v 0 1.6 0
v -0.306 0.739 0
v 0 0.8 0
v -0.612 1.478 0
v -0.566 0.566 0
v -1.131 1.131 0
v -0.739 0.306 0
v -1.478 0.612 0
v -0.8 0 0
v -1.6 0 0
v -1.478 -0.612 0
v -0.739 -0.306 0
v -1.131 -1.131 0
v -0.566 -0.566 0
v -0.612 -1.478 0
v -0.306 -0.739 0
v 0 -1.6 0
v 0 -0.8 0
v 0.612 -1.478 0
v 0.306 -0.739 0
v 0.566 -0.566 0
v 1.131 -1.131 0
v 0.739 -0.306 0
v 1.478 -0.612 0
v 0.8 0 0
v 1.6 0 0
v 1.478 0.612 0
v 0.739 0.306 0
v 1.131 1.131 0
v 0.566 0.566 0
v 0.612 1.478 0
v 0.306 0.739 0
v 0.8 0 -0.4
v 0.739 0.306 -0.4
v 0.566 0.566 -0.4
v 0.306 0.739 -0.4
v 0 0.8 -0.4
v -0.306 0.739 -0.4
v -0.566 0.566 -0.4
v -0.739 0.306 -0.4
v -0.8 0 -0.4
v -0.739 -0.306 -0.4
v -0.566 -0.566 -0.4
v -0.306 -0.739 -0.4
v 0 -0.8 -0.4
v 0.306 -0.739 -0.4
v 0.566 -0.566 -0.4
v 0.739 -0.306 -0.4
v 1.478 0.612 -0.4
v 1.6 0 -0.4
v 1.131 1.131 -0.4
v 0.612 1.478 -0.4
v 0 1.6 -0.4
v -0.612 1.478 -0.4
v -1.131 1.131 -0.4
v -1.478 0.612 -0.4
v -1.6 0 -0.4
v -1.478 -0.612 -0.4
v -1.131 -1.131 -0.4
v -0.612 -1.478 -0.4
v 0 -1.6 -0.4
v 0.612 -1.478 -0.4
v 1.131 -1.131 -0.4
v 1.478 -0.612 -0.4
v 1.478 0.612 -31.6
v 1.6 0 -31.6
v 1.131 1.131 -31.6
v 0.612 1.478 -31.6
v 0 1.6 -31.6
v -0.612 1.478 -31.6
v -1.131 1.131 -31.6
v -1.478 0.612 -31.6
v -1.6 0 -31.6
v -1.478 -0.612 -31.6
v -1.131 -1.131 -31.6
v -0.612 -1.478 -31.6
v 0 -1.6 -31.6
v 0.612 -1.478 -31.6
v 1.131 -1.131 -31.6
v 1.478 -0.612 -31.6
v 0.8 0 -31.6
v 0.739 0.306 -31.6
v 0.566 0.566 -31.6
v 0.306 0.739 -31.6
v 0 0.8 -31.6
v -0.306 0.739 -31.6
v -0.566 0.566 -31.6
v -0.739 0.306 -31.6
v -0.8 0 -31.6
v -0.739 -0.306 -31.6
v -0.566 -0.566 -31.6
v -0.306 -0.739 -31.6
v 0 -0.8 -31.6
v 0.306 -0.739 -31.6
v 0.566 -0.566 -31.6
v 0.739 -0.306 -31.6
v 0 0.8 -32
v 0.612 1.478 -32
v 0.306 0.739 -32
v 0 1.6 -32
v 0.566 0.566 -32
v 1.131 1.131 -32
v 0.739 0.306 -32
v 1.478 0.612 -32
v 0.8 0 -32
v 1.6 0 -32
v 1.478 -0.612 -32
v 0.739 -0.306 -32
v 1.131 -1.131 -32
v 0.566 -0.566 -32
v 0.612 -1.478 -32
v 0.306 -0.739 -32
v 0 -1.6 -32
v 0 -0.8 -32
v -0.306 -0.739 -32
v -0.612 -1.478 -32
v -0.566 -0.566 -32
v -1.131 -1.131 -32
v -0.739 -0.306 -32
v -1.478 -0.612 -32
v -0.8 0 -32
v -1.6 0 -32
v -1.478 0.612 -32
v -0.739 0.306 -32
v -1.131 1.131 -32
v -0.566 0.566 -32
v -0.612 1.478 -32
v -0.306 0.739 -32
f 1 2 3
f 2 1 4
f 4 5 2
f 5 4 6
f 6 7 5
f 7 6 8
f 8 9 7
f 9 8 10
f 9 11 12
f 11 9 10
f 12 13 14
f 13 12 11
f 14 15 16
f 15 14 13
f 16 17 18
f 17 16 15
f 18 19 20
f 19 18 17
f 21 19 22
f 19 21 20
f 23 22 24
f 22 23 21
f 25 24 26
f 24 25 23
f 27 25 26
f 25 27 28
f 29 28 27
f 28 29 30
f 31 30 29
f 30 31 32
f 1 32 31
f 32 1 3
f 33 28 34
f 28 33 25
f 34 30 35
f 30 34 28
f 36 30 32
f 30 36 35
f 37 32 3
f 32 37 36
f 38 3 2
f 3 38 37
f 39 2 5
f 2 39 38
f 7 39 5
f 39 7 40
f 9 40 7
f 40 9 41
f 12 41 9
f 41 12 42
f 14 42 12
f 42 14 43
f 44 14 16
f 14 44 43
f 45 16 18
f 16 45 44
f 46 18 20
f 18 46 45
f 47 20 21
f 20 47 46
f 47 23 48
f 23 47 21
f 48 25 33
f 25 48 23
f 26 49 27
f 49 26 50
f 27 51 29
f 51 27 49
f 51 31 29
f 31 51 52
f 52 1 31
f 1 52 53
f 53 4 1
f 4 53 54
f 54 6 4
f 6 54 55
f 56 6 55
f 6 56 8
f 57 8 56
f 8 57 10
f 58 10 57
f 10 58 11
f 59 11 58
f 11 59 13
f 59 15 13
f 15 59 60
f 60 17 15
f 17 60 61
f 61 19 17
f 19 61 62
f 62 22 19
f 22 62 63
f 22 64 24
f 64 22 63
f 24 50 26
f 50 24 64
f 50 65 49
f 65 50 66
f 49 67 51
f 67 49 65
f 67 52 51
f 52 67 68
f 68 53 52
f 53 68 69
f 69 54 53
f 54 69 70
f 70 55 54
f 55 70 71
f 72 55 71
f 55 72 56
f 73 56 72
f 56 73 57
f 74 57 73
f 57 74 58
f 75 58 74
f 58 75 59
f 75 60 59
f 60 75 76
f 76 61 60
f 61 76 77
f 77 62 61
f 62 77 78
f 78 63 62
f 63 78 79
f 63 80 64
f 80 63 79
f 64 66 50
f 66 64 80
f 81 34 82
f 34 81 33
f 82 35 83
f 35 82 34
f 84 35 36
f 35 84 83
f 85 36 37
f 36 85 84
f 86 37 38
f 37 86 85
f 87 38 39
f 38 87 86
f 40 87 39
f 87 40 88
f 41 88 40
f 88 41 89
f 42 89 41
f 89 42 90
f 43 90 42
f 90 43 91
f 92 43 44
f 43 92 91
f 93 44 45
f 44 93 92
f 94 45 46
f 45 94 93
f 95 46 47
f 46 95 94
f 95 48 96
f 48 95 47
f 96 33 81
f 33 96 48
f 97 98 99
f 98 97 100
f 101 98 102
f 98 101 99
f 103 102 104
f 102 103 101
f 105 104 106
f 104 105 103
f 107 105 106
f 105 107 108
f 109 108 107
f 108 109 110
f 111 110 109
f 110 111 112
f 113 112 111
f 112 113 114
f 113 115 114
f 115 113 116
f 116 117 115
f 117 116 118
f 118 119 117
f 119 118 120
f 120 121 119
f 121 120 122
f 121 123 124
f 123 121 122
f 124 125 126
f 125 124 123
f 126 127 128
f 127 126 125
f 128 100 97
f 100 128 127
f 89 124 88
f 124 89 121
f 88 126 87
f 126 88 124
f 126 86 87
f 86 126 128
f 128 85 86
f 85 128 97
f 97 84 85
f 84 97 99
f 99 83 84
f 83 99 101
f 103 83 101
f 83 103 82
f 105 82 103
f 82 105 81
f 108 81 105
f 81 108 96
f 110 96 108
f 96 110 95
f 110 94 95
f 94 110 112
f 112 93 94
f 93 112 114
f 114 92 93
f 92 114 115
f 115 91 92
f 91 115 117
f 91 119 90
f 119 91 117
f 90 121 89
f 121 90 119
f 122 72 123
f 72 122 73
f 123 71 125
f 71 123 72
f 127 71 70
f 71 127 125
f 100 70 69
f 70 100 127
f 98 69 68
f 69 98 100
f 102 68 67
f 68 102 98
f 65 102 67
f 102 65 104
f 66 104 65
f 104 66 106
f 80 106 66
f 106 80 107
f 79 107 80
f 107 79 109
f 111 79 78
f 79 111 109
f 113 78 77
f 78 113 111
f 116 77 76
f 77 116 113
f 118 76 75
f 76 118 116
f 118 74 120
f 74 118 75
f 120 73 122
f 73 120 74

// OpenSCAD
// file: ../p/4-4ring1.scad
use <../lib.scad>
function ldraw_lib__4_4ring1() = [
// 0 Ring  1 x 1.0
// 0 Name: 4-4ring1.dat
// 0 Author: James Jessiman
// 0 !LDRAW_ORG Primitive UPDATE 2009-01
// 0 !LICENSE Licensed under CC BY 4.0 : see CAreadme.txt
// 
// 0 BFC CERTIFY CCW
  [0,"BFC","CERTIFY"],
  [0,"BFC","CCW"],
// 
// 0 !HISTORY 1998-12-15 [PTadmin] Official Update 1998-10
// 0 !HISTORY 2002-04-08 [BrickCaster] Modified for BFC compliance
// 0 !HISTORY 2002-04-25 [PTadmin] Official Update 2002-02
// 0 !HISTORY 2007-06-24 [PTadmin] Header formatted for Contributor Agreement
// 0 !HISTORY 2008-07-01 [PTadmin] Official Update 2008-01
// 0 !HISTORY 2008-08-26 [cwdee] Switch polygon winding and rename
// 0 !HISTORY 2009-05-02 [PTadmin] Official Update 2009-01
// 
// 
// 4 16 -0.7654 0 1.8478 -0.3827 0 0.9239 0 0 1 0 0 2
  [4,16,-0.7654,0,1.8478,-0.3827,0,0.9239,0,0,1,0,0,2],
// 4 16 -1.4142 0 1.4142 -0.7071 0 0.7071 -0.3827 0 0.9239 -0.7654 0 1.8478
  [4,16,-1.4142,0,1.4142,-0.7071,0,0.7071,-0.3827,0,0.9239,-0.7654,0,1.8478],
// 4 16 -1.8478 0 0.7654 -0.9239 0 0.3827 -0.7071 0 0.7071 -1.4142 0 1.41420
  [4,16,-1.8478,0,0.7654,-0.9239,0,0.3827,-0.7071,0,0.7071,-1.4142,0,1.41420],
// 4 16 -2 0 0 -1 0 0 -0.9239 0 0.3827 -1.8478 0 0.7654
  [4,16,-2,0,0,-1,0,0,-0.9239,0,0.3827,-1.8478,0,0.7654],
// 4 16 -1.8478 0 -0.7654 -0.9239 0 -0.3827 -1 0 0 -2 0 0
  [4,16,-1.8478,0,-0.7654,-0.9239,0,-0.3827,-1,0,0,-2,0,0],
// 4 16 -1.4142 0 -1.4142 -0.7071 0 -0.7071 -0.9239 0 -0.3827 -1.8478 0 -0.7654
  [4,16,-1.4142,0,-1.4142,-0.7071,0,-0.7071,-0.9239,0,-0.3827,-1.8478,0,-0.7654],
// 4 16 -0.7654 0 -1.8478 -0.3827 0 -0.9239 -0.7071 0 -0.7071 -1.4142 0 -1.4142
  [4,16,-0.7654,0,-1.8478,-0.3827,0,-0.9239,-0.7071,0,-0.7071,-1.4142,0,-1.4142],
// 4 16 0 0 -2 0 0 -1 -0.3827 0 -0.9239 -0.7654 0 -1.8478
  [4,16,0,0,-2,0,0,-1,-0.3827,0,-0.9239,-0.7654,0,-1.8478],
// 4 16 0.7654 0 -1.8478 0.3827 0 -0.9239 0 0 -1 0 0 -2
  [4,16,0.7654,0,-1.8478,0.3827,0,-0.9239,0,0,-1,0,0,-2],
// 4 16 1.4142 0 -1.4142 0.7071 0 -0.7071 0.3827 0 -0.9239 0.7654 0 -1.8478
  [4,16,1.4142,0,-1.4142,0.7071,0,-0.7071,0.3827,0,-0.9239,0.7654,0,-1.8478],
// 4 16 1.8478 0 -0.7654 0.9239 0 -0.3827 0.7071 0 -0.7071 1.4142 0 -1.4142
  [4,16,1.8478,0,-0.7654,0.9239,0,-0.3827,0.7071,0,-0.7071,1.4142,0,-1.4142],
// 4 16 2 0 0 1 0 0 0.9239 0 -0.3827 1.8478 0 -0.7654
  [4,16,2,0,0,1,0,0,0.9239,0,-0.3827,1.8478,0,-0.7654],
// 4 16 1.8478 0 0.7654 0.9239 0 0.3827 1 0 0 2 0 0
  [4,16,1.8478,0,0.7654,0.9239,0,0.3827,1,0,0,2,0,0],
// 4 16 1.4142 0 1.4142 0.7071 0 0.7071 0.9239 0 0.3827 1.8478 0 0.7654
  [4,16,1.4142,0,1.4142,0.7071,0,0.7071,0.9239,0,0.3827,1.8478,0,0.7654],
// 4 16 0.7654 0 1.8478 0.3827 0 0.9239 0.7071 0 0.7071 1.4142 0 1.4142
  [4,16,0.7654,0,1.8478,0.3827,0,0.9239,0.7071,0,0.7071,1.4142,0,1.4142],
// 4 16 0 0 2 0 0 1 0.3827 0 0.9239 0.7654 0 1.8478
  [4,16,0,0,2,0,0,1,0.3827,0,0.9239,0.7654,0,1.8478],
// 0
];
module ldraw_lib__4_4ring1(step=0, col=false, unit=2/5, alt=false, line=0.2, solid=!$preview)
    makepoly(ldraw_lib__4_4ring1(), step=step, col=col, unit=unit, alt=alt, line=line, solid=solid);
ldraw_lib__4_4ring1(line=0.2);
// file: ../p/4-4edge.scad
use <../lib.scad>
function ldraw_lib__4_4edge() = [
// 0 Circle 1.0
// 0 Name: 4-4edge.dat
// 0 Author: James Jessiman
// 0 !LDRAW_ORG Primitive UPDATE 2017-01
// 0 !LICENSE Licensed under CC BY 4.0 : see CAreadme.txt
// 
// 0 BFC CERTIFY CCW
  [0,"BFC","CERTIFY"],
  [0,"BFC","CCW"],
// 
// 0 !HISTORY 1998-12-15 [PTadmin] Official Update 1998-10
// 0 !HISTORY 2005-12-28 [PTadmin] Official Update 2005-01
// 0 !HISTORY 2007-06-24 [PTadmin] Header formatted for Contributor Agreement
// 0 !HISTORY 2008-07-01 [PTadmin] Official Update 2008-01
// 0 !HISTORY 2017-01-15 [Steffen] BFCed
// 0 !HISTORY 2017-12-30 [PTadmin] Official Update 2017-01
// 
// 
// 2 24 1 0 0 0.9239 0 0.3827
  [2,24,1,0,0,0.9239,0,0.3827],
// 2 24 0.9239 0 0.3827 0.7071 0 0.7071
  [2,24,0.9239,0,0.3827,0.7071,0,0.7071],
// 2 24 0.7071 0 0.7071 0.3827 0 0.9239
  [2,24,0.7071,0,0.7071,0.3827,0,0.9239],
// 2 24 0.3827 0 0.9239 0 0 1
  [2,24,0.3827,0,0.9239,0,0,1],
// 2 24 0 0 1 -0.3827 0 0.9239
  [2,24,0,0,1,-0.3827,0,0.9239],
// 2 24 -0.3827 0 0.9239 -0.7071 0 0.7071
  [2,24,-0.3827,0,0.9239,-0.7071,0,0.7071],
// 2 24 -0.7071 0 0.7071 -0.9239 0 0.3827
  [2,24,-0.7071,0,0.7071,-0.9239,0,0.3827],
// 2 24 -0.9239 0 0.3827 -1 0 -0
  [2,24,-0.9239,0,0.3827,-1,0,-0],
// 2 24 -1 0 -0 -0.9239 0 -0.3827
  [2,24,-1,0,-0,-0.9239,0,-0.3827],
// 2 24 -0.9239 0 -0.3827 -0.7071 0 -0.7071
  [2,24,-0.9239,0,-0.3827,-0.7071,0,-0.7071],
// 2 24 -0.7071 0 -0.7071 -0.3827 0 -0.9239
  [2,24,-0.7071,0,-0.7071,-0.3827,0,-0.9239],
// 2 24 -0.3827 0 -0.9239 0 0 -1
  [2,24,-0.3827,0,-0.9239,0,0,-1],
// 2 24 0 0 -1 0.3827 0 -0.9239
  [2,24,0,0,-1,0.3827,0,-0.9239],
// 2 24 0.3827 0 -0.9239 0.7071 0 -0.7071
  [2,24,0.3827,0,-0.9239,0.7071,0,-0.7071],
// 2 24 0.7071 0 -0.7071 0.9239 0 -0.3827
  [2,24,0.7071,0,-0.7071,0.9239,0,-0.3827],
// 2 24 0.9239 0 -0.3827 1 0 0
  [2,24,0.9239,0,-0.3827,1,0,0],
];
module ldraw_lib__4_4edge(step=0, col=false, unit=2/5, alt=false, line=0.2, solid=!$preview)
    makepoly(ldraw_lib__4_4edge(), step=step, col=col, unit=unit, alt=alt, line=line, solid=solid);
ldraw_lib__4_4edge(line=0.2);
// file: ../p/4-4cyli.scad
use <../lib.scad>
function ldraw_lib__4_4cyli() = [
// 0 Cylinder 1.0
// 0 Name: 4-4cyli.dat
// 0 Author: James Jessiman
// 0 !LDRAW_ORG Primitive UPDATE 2005-01
// 0 !LICENSE Licensed under CC BY 4.0 : see CAreadme.txt
// 
// 0 BFC CERTIFY CCW
  [0,"BFC","CERTIFY"],
  [0,"BFC","CCW"],
// 
// 0 !HISTORY 1998-12-15 [PTadmin] Official Update 1998-10
// 0 !HISTORY 2002-03-23 [sbliss] Added BFC statement; merged headers from files in distributions LDraw 0.27 and Complete.
// 0 !HISTORY 2002-04-25 [PTadmin] Official Update 2002-02
// 0 !HISTORY 2004-12-14 [guyvivan] BFC CCW
// 0 !HISTORY 2005-12-28 [PTadmin] Official Update 2005-01
// 0 !HISTORY 2007-06-24 [PTadmin] Header formatted for Contributor Agreement
// 0 !HISTORY 2008-07-01 [PTadmin] Official Update 2008-01
// 
// 
// 4 16 1 1 0 0.9239 1 0.3827 0.9239 0 0.3827 1 0 0
  [4,16,1,1,0,0.9239,1,0.3827,0.9239,0,0.3827,1,0,0],
// 5 24 1 0 0 1 1 0 0.9239 0 0.3827 0.9239 0 -0.3827
  [5,24,1,0,0,1,1,0,0.9239,0,0.3827,0.9239,0,-0.3827],
// 4 16 0.9239 1 0.3827 0.7071 1 0.7071 0.7071 0 0.7071 0.9239 0 0.3827
  [4,16,0.9239,1,0.3827,0.7071,1,0.7071,0.7071,0,0.7071,0.9239,0,0.3827],
// 5 24 0.9239 0 0.3827 0.9239 1 0.3827 0.7071 0 0.7071 1 0 0
  [5,24,0.9239,0,0.3827,0.9239,1,0.3827,0.7071,0,0.7071,1,0,0],
// 4 16 0.7071 1 0.7071 0.3827 1 0.9239 0.3827 0 0.9239 0.7071 0 0.7071
  [4,16,0.7071,1,0.7071,0.3827,1,0.9239,0.3827,0,0.9239,0.7071,0,0.7071],
// 5 24 0.7071 0 0.7071 0.7071 1 0.7071 0.3827 0 0.9239 0.9239 0 0.3827
  [5,24,0.7071,0,0.7071,0.7071,1,0.7071,0.3827,0,0.9239,0.9239,0,0.3827],
// 4 16 0.3827 1 0.9239 0 1 1 0 0 1 0.3827 0 0.9239
  [4,16,0.3827,1,0.9239,0,1,1,0,0,1,0.3827,0,0.9239],
// 5 24 0.3827 0 0.9239 0.3827 1 0.9239 0 0 1 0.7071 0 0.7071
  [5,24,0.3827,0,0.9239,0.3827,1,0.9239,0,0,1,0.7071,0,0.7071],
// 4 16 0 1 1 -0.3827 1 0.9239 -0.3827 0 0.9239 0 0 1
  [4,16,0,1,1,-0.3827,1,0.9239,-0.3827,0,0.9239,0,0,1],
// 5 24 0 0 1 0 1 1 -0.3827 0 0.9239 0.3827 0 0.9239
  [5,24,0,0,1,0,1,1,-0.3827,0,0.9239,0.3827,0,0.9239],
// 4 16 -0.3827 1 0.9239 -0.7071 1 0.7071 -0.7071 0 0.7071 -0.3827 0 0.9239
  [4,16,-0.3827,1,0.9239,-0.7071,1,0.7071,-0.7071,0,0.7071,-0.3827,0,0.9239],
// 5 24 -0.3827 0 0.9239 -0.3827 1 0.9239 -0.7071 0 0.7071 0 0 1
  [5,24,-0.3827,0,0.9239,-0.3827,1,0.9239,-0.7071,0,0.7071,0,0,1],
// 4 16 -0.7071 1 0.7071 -0.9239 1 0.3827 -0.9239 0 0.3827 -0.7071 0 0.7071
  [4,16,-0.7071,1,0.7071,-0.9239,1,0.3827,-0.9239,0,0.3827,-0.7071,0,0.7071],
// 5 24 -0.7071 0 0.7071 -0.7071 1 0.7071 -0.9239 0 0.3827 -0.3827 0 0.9239
  [5,24,-0.7071,0,0.7071,-0.7071,1,0.7071,-0.9239,0,0.3827,-0.3827,0,0.9239],
// 4 16 -0.9239 1 0.3827 -1 1 0 -1 0 0 -0.9239 0 0.3827
  [4,16,-0.9239,1,0.3827,-1,1,0,-1,0,0,-0.9239,0,0.3827],
// 5 24 -0.9239 0 0.3827 -0.9239 1 0.3827 -1 0 0 -0.7071 0 0.7071
  [5,24,-0.9239,0,0.3827,-0.9239,1,0.3827,-1,0,0,-0.7071,0,0.7071],
// 4 16 -1 1 0 -0.9239 1 -0.3827 -0.9239 0 -0.3827 -1 0 0
  [4,16,-1,1,0,-0.9239,1,-0.3827,-0.9239,0,-0.3827,-1,0,0],
// 5 24 -1 0 0 -1 1 0 -0.9239 0 -0.3827 -0.9239 0 0.3827
  [5,24,-1,0,0,-1,1,0,-0.9239,0,-0.3827,-0.9239,0,0.3827],
// 4 16 -0.9239 1 -0.3827 -0.7071 1 -0.7071 -0.7071 0 -0.7071 -0.9239 0 -0.3827
  [4,16,-0.9239,1,-0.3827,-0.7071,1,-0.7071,-0.7071,0,-0.7071,-0.9239,0,-0.3827],
// 5 24 -0.9239 0 -0.3827 -0.9239 1 -0.3827 -0.7071 0 -0.7071 -1 0 0
  [5,24,-0.9239,0,-0.3827,-0.9239,1,-0.3827,-0.7071,0,-0.7071,-1,0,0],
// 4 16 -0.7071 1 -0.7071 -0.3827 1 -0.9239 -0.3827 0 -0.9239 -0.7071 0 -0.7071
  [4,16,-0.7071,1,-0.7071,-0.3827,1,-0.9239,-0.3827,0,-0.9239,-0.7071,0,-0.7071],
// 5 24 -0.7071 0 -0.7071 -0.7071 1 -0.7071 -0.3827 0 -0.9239 -0.9239 0 -0.3827
  [5,24,-0.7071,0,-0.7071,-0.7071,1,-0.7071,-0.3827,0,-0.9239,-0.9239,0,-0.3827],
// 4 16 -0.3827 1 -0.9239 0 1 -1 0 0 -1 -0.3827 0 -0.9239
  [4,16,-0.3827,1,-0.9239,0,1,-1,0,0,-1,-0.3827,0,-0.9239],
// 5 24 -0.3827 0 -0.9239 -0.3827 1 -0.9239 0 0 -1 -0.7071 0 -0.7071
  [5,24,-0.3827,0,-0.9239,-0.3827,1,-0.9239,0,0,-1,-0.7071,0,-0.7071],
// 4 16 0 1 -1 0.3827 1 -0.9239 0.3827 0 -0.9239 0 0 -1
  [4,16,0,1,-1,0.3827,1,-0.9239,0.3827,0,-0.9239,0,0,-1],
// 5 24 0 0 -1 0 1 -1 0.3827 0 -0.9239 -0.3827 0 -0.9239
  [5,24,0,0,-1,0,1,-1,0.3827,0,-0.9239,-0.3827,0,-0.9239],
// 4 16 0.3827 1 -0.9239 0.7071 1 -0.7071 0.7071 0 -0.7071 0.3827 0 -0.9239
  [4,16,0.3827,1,-0.9239,0.7071,1,-0.7071,0.7071,0,-0.7071,0.3827,0,-0.9239],
// 5 24 0.3827 0 -0.9239 0.3827 1 -0.9239 0.7071 0 -0.7071 0 0 -1
  [5,24,0.3827,0,-0.9239,0.3827,1,-0.9239,0.7071,0,-0.7071,0,0,-1],
// 4 16 0.7071 1 -0.7071 0.9239 1 -0.3827 0.9239 0 -0.3827 0.7071 0 -0.7071
  [4,16,0.7071,1,-0.7071,0.9239,1,-0.3827,0.9239,0,-0.3827,0.7071,0,-0.7071],
// 5 24 0.7071 0 -0.7071 0.7071 1 -0.7071 0.9239 0 -0.3827 0.3827 0 -0.9239
  [5,24,0.7071,0,-0.7071,0.7071,1,-0.7071,0.9239,0,-0.3827,0.3827,0,-0.9239],
// 4 16 0.9239 1 -0.3827 1 1 0 1 0 0 0.9239 0 -0.3827
  [4,16,0.9239,1,-0.3827,1,1,0,1,0,0,0.9239,0,-0.3827],
// 5 24 0.9239 0 -0.3827 0.9239 1 -0.3827 1 0 0 0.7071 0 -0.7071
  [5,24,0.9239,0,-0.3827,0.9239,1,-0.3827,1,0,0,0.7071,0,-0.7071],
// 0
];
module ldraw_lib__4_4cyli(step=0, col=false, unit=2/5, alt=false, line=0.2, solid=!$preview)
    makepoly(ldraw_lib__4_4cyli(), step=step, col=col, unit=unit, alt=alt, line=line, solid=solid);
ldraw_lib__4_4cyli(line=0.2);
// file: u9053.scad
use <../lib.scad>
use <../p/4-4cyli.scad>
use <../p/4-4edge.scad>
use <../p/4-4ring1.scad>
function ldraw_lib__u9053() = [
// 0 ~Technic Flex-System Hose End
// 0 Name: u9053.dat
// 0 Author: William Howard [WilliamH]
// 0 !LDRAW_ORG Part UPDATE 2011-02
// 0 !LICENSE Licensed under CC BY 2.0 and CC BY 4.0 : see CAreadme.txt
// 
// 0 BFC CERTIFY CCW
  [0,"BFC","CERTIFY"],
  [0,"BFC","CCW"],
// 
// 0 !HISTORY 2011-12-21 [cwdee] Reworked subparting technique
// 0 !HISTORY 2011-12-23 [PTadmin] Renamed from 76
// 0 !HISTORY 2011-12-29 [PTadmin] Official Update 2011-02
// 
// 
// 1 16 0 0 0 2 0 0 0 1 0 0 0 2 4-4ring1.dat
  [1,16,0,0,0,2,0,0,0,1,0,0,0,2, ldraw_lib__4_4ring1()],
// 1 16 0 0 0 2 0 0 0 1 0 0 0 2 4-4edge.dat
  [1,16,0,0,0,2,0,0,0,1,0,0,0,2, ldraw_lib__4_4edge()],
// 0 BFC INVERTNEXT
  [0,"BFC","INVERTNEXT"],
// 1 16 0 0 0 2 0 0 0 1 0 0 0 2 4-4cyli.dat
  [1,16,0,0,0,2,0,0,0,1,0,0,0,2, ldraw_lib__4_4cyli()],
// 1 16 0 0 0 4 0 0 0 1 0 0 0 4 4-4edge.dat
  [1,16,0,0,0,4,0,0,0,1,0,0,0,4, ldraw_lib__4_4edge()],
// 1 16 0 0 0 4 0 0 0 1 0 0 0 4 4-4cyli.dat
  [1,16,0,0,0,4,0,0,0,1,0,0,0,4, ldraw_lib__4_4cyli()],
// 0
];
module ldraw_lib__u9053(step=0, col=false, unit=2/5, alt=false, line=0.2, solid=!$preview)
    makepoly(ldraw_lib__u9053(), step=step, col=col, unit=unit, alt=alt, line=line, solid=solid);
ldraw_lib__u9053(line=0.2);
// file: 77.scad
use <../lib.scad>
use <../p/4-4cyli.scad>
function ldraw_lib__77() = [
// 0 ~Technic Flex-System Hose Segment
// 0 Name: 77.dat
// 0 Author: William Howard [WilliamH]
// 0 !LDRAW_ORG Part UPDATE 2011-02
// 0 !LICENSE Licensed under CC BY 2.0 and CC BY 4.0 : see CAreadme.txt
// 
// 0 BFC CERTIFY CCW
  [0,"BFC","CERTIFY"],
  [0,"BFC","CCW"],
// 
// 0 !HISTORY 2011-12-21 [cwdee] Reworked subparting technique
// 0 !HISTORY 2011-12-29 [PTadmin] Official Update 2011-02
// 
// 
// 1 16 0 0 0 4 0 0 0 1 0 0 0 4 4-4cyli.dat
  [1,16,0,0,0,4,0,0,0,1,0,0,0,4, ldraw_lib__4_4cyli()],
// 0 BFC INVERTNEXT
  [0,"BFC","INVERTNEXT"],
// 1 16 0 0 0 2 0 0 0 1 0 0 0 2 4-4cyli.dat
  [1,16,0,0,0,2,0,0,0,1,0,0,0,2, ldraw_lib__4_4cyli()],
// 0
];
module ldraw_lib__77(step=0, col=false, unit=2/5, alt=false, line=0.2, solid=!$preview)
    makepoly(ldraw_lib__77(), step=step, col=col, unit=unit, alt=alt, line=line, solid=solid);
ldraw_lib__77(line=0.2);
// main file
use <../lib.scad>
use <77.scad>
use <u9053.scad>
function ldraw_lib__76250() = [
// 0 Technic Flex-System Hose  4L (80LDU)
// 0 Name: 76250.dat
// 0 Author: Tim Gould [timgould]
// 0 !LDRAW_ORG Part UPDATE 2013-01
// 0 !LICENSE Licensed under CC BY 4.0 : see CAreadme.txt
// 
// 0 BFC CERTIFY CCW
  [0,"BFC","CERTIFY"],
  [0,"BFC","CCW"],
// 
// 0 !KEYWORDS bar, BrickLink 75c04, Rebrickable 75c04, tube
// 
// 0 !HISTORY 2013-07-21 [PTadmin] Official Update 2013-01
// 
// 
// 1 16 0 0 0 1 0 0 0 1 0 0 0 1 u9053.dat
  [1,16,0,0,0,1,0,0,0,1,0,0,0,1, ldraw_lib__u9053()],
// 1 16 0 1 0 1 0 0 0 78 0 0 0 1 77.dat
  [1,16,0,1,0,1,0,0,0,78,0,0,0,1, ldraw_lib__77()],
// 1 16 0 80 0 -1 0 0 0 -1 0 0 0 1 u9053.dat
  [1,16,0,80,0,-1,0,0,0,-1,0,0,0,1, ldraw_lib__u9053()],
];
module ldraw_lib__76250(step=0, col=false, unit=2/5, alt=false, line=0.2, solid=!$preview)
    makepoly(ldraw_lib__76250(), step=step, col=col, unit=unit, alt=alt, line=line, solid=solid);
ldraw_lib__76250(line=0.2);
